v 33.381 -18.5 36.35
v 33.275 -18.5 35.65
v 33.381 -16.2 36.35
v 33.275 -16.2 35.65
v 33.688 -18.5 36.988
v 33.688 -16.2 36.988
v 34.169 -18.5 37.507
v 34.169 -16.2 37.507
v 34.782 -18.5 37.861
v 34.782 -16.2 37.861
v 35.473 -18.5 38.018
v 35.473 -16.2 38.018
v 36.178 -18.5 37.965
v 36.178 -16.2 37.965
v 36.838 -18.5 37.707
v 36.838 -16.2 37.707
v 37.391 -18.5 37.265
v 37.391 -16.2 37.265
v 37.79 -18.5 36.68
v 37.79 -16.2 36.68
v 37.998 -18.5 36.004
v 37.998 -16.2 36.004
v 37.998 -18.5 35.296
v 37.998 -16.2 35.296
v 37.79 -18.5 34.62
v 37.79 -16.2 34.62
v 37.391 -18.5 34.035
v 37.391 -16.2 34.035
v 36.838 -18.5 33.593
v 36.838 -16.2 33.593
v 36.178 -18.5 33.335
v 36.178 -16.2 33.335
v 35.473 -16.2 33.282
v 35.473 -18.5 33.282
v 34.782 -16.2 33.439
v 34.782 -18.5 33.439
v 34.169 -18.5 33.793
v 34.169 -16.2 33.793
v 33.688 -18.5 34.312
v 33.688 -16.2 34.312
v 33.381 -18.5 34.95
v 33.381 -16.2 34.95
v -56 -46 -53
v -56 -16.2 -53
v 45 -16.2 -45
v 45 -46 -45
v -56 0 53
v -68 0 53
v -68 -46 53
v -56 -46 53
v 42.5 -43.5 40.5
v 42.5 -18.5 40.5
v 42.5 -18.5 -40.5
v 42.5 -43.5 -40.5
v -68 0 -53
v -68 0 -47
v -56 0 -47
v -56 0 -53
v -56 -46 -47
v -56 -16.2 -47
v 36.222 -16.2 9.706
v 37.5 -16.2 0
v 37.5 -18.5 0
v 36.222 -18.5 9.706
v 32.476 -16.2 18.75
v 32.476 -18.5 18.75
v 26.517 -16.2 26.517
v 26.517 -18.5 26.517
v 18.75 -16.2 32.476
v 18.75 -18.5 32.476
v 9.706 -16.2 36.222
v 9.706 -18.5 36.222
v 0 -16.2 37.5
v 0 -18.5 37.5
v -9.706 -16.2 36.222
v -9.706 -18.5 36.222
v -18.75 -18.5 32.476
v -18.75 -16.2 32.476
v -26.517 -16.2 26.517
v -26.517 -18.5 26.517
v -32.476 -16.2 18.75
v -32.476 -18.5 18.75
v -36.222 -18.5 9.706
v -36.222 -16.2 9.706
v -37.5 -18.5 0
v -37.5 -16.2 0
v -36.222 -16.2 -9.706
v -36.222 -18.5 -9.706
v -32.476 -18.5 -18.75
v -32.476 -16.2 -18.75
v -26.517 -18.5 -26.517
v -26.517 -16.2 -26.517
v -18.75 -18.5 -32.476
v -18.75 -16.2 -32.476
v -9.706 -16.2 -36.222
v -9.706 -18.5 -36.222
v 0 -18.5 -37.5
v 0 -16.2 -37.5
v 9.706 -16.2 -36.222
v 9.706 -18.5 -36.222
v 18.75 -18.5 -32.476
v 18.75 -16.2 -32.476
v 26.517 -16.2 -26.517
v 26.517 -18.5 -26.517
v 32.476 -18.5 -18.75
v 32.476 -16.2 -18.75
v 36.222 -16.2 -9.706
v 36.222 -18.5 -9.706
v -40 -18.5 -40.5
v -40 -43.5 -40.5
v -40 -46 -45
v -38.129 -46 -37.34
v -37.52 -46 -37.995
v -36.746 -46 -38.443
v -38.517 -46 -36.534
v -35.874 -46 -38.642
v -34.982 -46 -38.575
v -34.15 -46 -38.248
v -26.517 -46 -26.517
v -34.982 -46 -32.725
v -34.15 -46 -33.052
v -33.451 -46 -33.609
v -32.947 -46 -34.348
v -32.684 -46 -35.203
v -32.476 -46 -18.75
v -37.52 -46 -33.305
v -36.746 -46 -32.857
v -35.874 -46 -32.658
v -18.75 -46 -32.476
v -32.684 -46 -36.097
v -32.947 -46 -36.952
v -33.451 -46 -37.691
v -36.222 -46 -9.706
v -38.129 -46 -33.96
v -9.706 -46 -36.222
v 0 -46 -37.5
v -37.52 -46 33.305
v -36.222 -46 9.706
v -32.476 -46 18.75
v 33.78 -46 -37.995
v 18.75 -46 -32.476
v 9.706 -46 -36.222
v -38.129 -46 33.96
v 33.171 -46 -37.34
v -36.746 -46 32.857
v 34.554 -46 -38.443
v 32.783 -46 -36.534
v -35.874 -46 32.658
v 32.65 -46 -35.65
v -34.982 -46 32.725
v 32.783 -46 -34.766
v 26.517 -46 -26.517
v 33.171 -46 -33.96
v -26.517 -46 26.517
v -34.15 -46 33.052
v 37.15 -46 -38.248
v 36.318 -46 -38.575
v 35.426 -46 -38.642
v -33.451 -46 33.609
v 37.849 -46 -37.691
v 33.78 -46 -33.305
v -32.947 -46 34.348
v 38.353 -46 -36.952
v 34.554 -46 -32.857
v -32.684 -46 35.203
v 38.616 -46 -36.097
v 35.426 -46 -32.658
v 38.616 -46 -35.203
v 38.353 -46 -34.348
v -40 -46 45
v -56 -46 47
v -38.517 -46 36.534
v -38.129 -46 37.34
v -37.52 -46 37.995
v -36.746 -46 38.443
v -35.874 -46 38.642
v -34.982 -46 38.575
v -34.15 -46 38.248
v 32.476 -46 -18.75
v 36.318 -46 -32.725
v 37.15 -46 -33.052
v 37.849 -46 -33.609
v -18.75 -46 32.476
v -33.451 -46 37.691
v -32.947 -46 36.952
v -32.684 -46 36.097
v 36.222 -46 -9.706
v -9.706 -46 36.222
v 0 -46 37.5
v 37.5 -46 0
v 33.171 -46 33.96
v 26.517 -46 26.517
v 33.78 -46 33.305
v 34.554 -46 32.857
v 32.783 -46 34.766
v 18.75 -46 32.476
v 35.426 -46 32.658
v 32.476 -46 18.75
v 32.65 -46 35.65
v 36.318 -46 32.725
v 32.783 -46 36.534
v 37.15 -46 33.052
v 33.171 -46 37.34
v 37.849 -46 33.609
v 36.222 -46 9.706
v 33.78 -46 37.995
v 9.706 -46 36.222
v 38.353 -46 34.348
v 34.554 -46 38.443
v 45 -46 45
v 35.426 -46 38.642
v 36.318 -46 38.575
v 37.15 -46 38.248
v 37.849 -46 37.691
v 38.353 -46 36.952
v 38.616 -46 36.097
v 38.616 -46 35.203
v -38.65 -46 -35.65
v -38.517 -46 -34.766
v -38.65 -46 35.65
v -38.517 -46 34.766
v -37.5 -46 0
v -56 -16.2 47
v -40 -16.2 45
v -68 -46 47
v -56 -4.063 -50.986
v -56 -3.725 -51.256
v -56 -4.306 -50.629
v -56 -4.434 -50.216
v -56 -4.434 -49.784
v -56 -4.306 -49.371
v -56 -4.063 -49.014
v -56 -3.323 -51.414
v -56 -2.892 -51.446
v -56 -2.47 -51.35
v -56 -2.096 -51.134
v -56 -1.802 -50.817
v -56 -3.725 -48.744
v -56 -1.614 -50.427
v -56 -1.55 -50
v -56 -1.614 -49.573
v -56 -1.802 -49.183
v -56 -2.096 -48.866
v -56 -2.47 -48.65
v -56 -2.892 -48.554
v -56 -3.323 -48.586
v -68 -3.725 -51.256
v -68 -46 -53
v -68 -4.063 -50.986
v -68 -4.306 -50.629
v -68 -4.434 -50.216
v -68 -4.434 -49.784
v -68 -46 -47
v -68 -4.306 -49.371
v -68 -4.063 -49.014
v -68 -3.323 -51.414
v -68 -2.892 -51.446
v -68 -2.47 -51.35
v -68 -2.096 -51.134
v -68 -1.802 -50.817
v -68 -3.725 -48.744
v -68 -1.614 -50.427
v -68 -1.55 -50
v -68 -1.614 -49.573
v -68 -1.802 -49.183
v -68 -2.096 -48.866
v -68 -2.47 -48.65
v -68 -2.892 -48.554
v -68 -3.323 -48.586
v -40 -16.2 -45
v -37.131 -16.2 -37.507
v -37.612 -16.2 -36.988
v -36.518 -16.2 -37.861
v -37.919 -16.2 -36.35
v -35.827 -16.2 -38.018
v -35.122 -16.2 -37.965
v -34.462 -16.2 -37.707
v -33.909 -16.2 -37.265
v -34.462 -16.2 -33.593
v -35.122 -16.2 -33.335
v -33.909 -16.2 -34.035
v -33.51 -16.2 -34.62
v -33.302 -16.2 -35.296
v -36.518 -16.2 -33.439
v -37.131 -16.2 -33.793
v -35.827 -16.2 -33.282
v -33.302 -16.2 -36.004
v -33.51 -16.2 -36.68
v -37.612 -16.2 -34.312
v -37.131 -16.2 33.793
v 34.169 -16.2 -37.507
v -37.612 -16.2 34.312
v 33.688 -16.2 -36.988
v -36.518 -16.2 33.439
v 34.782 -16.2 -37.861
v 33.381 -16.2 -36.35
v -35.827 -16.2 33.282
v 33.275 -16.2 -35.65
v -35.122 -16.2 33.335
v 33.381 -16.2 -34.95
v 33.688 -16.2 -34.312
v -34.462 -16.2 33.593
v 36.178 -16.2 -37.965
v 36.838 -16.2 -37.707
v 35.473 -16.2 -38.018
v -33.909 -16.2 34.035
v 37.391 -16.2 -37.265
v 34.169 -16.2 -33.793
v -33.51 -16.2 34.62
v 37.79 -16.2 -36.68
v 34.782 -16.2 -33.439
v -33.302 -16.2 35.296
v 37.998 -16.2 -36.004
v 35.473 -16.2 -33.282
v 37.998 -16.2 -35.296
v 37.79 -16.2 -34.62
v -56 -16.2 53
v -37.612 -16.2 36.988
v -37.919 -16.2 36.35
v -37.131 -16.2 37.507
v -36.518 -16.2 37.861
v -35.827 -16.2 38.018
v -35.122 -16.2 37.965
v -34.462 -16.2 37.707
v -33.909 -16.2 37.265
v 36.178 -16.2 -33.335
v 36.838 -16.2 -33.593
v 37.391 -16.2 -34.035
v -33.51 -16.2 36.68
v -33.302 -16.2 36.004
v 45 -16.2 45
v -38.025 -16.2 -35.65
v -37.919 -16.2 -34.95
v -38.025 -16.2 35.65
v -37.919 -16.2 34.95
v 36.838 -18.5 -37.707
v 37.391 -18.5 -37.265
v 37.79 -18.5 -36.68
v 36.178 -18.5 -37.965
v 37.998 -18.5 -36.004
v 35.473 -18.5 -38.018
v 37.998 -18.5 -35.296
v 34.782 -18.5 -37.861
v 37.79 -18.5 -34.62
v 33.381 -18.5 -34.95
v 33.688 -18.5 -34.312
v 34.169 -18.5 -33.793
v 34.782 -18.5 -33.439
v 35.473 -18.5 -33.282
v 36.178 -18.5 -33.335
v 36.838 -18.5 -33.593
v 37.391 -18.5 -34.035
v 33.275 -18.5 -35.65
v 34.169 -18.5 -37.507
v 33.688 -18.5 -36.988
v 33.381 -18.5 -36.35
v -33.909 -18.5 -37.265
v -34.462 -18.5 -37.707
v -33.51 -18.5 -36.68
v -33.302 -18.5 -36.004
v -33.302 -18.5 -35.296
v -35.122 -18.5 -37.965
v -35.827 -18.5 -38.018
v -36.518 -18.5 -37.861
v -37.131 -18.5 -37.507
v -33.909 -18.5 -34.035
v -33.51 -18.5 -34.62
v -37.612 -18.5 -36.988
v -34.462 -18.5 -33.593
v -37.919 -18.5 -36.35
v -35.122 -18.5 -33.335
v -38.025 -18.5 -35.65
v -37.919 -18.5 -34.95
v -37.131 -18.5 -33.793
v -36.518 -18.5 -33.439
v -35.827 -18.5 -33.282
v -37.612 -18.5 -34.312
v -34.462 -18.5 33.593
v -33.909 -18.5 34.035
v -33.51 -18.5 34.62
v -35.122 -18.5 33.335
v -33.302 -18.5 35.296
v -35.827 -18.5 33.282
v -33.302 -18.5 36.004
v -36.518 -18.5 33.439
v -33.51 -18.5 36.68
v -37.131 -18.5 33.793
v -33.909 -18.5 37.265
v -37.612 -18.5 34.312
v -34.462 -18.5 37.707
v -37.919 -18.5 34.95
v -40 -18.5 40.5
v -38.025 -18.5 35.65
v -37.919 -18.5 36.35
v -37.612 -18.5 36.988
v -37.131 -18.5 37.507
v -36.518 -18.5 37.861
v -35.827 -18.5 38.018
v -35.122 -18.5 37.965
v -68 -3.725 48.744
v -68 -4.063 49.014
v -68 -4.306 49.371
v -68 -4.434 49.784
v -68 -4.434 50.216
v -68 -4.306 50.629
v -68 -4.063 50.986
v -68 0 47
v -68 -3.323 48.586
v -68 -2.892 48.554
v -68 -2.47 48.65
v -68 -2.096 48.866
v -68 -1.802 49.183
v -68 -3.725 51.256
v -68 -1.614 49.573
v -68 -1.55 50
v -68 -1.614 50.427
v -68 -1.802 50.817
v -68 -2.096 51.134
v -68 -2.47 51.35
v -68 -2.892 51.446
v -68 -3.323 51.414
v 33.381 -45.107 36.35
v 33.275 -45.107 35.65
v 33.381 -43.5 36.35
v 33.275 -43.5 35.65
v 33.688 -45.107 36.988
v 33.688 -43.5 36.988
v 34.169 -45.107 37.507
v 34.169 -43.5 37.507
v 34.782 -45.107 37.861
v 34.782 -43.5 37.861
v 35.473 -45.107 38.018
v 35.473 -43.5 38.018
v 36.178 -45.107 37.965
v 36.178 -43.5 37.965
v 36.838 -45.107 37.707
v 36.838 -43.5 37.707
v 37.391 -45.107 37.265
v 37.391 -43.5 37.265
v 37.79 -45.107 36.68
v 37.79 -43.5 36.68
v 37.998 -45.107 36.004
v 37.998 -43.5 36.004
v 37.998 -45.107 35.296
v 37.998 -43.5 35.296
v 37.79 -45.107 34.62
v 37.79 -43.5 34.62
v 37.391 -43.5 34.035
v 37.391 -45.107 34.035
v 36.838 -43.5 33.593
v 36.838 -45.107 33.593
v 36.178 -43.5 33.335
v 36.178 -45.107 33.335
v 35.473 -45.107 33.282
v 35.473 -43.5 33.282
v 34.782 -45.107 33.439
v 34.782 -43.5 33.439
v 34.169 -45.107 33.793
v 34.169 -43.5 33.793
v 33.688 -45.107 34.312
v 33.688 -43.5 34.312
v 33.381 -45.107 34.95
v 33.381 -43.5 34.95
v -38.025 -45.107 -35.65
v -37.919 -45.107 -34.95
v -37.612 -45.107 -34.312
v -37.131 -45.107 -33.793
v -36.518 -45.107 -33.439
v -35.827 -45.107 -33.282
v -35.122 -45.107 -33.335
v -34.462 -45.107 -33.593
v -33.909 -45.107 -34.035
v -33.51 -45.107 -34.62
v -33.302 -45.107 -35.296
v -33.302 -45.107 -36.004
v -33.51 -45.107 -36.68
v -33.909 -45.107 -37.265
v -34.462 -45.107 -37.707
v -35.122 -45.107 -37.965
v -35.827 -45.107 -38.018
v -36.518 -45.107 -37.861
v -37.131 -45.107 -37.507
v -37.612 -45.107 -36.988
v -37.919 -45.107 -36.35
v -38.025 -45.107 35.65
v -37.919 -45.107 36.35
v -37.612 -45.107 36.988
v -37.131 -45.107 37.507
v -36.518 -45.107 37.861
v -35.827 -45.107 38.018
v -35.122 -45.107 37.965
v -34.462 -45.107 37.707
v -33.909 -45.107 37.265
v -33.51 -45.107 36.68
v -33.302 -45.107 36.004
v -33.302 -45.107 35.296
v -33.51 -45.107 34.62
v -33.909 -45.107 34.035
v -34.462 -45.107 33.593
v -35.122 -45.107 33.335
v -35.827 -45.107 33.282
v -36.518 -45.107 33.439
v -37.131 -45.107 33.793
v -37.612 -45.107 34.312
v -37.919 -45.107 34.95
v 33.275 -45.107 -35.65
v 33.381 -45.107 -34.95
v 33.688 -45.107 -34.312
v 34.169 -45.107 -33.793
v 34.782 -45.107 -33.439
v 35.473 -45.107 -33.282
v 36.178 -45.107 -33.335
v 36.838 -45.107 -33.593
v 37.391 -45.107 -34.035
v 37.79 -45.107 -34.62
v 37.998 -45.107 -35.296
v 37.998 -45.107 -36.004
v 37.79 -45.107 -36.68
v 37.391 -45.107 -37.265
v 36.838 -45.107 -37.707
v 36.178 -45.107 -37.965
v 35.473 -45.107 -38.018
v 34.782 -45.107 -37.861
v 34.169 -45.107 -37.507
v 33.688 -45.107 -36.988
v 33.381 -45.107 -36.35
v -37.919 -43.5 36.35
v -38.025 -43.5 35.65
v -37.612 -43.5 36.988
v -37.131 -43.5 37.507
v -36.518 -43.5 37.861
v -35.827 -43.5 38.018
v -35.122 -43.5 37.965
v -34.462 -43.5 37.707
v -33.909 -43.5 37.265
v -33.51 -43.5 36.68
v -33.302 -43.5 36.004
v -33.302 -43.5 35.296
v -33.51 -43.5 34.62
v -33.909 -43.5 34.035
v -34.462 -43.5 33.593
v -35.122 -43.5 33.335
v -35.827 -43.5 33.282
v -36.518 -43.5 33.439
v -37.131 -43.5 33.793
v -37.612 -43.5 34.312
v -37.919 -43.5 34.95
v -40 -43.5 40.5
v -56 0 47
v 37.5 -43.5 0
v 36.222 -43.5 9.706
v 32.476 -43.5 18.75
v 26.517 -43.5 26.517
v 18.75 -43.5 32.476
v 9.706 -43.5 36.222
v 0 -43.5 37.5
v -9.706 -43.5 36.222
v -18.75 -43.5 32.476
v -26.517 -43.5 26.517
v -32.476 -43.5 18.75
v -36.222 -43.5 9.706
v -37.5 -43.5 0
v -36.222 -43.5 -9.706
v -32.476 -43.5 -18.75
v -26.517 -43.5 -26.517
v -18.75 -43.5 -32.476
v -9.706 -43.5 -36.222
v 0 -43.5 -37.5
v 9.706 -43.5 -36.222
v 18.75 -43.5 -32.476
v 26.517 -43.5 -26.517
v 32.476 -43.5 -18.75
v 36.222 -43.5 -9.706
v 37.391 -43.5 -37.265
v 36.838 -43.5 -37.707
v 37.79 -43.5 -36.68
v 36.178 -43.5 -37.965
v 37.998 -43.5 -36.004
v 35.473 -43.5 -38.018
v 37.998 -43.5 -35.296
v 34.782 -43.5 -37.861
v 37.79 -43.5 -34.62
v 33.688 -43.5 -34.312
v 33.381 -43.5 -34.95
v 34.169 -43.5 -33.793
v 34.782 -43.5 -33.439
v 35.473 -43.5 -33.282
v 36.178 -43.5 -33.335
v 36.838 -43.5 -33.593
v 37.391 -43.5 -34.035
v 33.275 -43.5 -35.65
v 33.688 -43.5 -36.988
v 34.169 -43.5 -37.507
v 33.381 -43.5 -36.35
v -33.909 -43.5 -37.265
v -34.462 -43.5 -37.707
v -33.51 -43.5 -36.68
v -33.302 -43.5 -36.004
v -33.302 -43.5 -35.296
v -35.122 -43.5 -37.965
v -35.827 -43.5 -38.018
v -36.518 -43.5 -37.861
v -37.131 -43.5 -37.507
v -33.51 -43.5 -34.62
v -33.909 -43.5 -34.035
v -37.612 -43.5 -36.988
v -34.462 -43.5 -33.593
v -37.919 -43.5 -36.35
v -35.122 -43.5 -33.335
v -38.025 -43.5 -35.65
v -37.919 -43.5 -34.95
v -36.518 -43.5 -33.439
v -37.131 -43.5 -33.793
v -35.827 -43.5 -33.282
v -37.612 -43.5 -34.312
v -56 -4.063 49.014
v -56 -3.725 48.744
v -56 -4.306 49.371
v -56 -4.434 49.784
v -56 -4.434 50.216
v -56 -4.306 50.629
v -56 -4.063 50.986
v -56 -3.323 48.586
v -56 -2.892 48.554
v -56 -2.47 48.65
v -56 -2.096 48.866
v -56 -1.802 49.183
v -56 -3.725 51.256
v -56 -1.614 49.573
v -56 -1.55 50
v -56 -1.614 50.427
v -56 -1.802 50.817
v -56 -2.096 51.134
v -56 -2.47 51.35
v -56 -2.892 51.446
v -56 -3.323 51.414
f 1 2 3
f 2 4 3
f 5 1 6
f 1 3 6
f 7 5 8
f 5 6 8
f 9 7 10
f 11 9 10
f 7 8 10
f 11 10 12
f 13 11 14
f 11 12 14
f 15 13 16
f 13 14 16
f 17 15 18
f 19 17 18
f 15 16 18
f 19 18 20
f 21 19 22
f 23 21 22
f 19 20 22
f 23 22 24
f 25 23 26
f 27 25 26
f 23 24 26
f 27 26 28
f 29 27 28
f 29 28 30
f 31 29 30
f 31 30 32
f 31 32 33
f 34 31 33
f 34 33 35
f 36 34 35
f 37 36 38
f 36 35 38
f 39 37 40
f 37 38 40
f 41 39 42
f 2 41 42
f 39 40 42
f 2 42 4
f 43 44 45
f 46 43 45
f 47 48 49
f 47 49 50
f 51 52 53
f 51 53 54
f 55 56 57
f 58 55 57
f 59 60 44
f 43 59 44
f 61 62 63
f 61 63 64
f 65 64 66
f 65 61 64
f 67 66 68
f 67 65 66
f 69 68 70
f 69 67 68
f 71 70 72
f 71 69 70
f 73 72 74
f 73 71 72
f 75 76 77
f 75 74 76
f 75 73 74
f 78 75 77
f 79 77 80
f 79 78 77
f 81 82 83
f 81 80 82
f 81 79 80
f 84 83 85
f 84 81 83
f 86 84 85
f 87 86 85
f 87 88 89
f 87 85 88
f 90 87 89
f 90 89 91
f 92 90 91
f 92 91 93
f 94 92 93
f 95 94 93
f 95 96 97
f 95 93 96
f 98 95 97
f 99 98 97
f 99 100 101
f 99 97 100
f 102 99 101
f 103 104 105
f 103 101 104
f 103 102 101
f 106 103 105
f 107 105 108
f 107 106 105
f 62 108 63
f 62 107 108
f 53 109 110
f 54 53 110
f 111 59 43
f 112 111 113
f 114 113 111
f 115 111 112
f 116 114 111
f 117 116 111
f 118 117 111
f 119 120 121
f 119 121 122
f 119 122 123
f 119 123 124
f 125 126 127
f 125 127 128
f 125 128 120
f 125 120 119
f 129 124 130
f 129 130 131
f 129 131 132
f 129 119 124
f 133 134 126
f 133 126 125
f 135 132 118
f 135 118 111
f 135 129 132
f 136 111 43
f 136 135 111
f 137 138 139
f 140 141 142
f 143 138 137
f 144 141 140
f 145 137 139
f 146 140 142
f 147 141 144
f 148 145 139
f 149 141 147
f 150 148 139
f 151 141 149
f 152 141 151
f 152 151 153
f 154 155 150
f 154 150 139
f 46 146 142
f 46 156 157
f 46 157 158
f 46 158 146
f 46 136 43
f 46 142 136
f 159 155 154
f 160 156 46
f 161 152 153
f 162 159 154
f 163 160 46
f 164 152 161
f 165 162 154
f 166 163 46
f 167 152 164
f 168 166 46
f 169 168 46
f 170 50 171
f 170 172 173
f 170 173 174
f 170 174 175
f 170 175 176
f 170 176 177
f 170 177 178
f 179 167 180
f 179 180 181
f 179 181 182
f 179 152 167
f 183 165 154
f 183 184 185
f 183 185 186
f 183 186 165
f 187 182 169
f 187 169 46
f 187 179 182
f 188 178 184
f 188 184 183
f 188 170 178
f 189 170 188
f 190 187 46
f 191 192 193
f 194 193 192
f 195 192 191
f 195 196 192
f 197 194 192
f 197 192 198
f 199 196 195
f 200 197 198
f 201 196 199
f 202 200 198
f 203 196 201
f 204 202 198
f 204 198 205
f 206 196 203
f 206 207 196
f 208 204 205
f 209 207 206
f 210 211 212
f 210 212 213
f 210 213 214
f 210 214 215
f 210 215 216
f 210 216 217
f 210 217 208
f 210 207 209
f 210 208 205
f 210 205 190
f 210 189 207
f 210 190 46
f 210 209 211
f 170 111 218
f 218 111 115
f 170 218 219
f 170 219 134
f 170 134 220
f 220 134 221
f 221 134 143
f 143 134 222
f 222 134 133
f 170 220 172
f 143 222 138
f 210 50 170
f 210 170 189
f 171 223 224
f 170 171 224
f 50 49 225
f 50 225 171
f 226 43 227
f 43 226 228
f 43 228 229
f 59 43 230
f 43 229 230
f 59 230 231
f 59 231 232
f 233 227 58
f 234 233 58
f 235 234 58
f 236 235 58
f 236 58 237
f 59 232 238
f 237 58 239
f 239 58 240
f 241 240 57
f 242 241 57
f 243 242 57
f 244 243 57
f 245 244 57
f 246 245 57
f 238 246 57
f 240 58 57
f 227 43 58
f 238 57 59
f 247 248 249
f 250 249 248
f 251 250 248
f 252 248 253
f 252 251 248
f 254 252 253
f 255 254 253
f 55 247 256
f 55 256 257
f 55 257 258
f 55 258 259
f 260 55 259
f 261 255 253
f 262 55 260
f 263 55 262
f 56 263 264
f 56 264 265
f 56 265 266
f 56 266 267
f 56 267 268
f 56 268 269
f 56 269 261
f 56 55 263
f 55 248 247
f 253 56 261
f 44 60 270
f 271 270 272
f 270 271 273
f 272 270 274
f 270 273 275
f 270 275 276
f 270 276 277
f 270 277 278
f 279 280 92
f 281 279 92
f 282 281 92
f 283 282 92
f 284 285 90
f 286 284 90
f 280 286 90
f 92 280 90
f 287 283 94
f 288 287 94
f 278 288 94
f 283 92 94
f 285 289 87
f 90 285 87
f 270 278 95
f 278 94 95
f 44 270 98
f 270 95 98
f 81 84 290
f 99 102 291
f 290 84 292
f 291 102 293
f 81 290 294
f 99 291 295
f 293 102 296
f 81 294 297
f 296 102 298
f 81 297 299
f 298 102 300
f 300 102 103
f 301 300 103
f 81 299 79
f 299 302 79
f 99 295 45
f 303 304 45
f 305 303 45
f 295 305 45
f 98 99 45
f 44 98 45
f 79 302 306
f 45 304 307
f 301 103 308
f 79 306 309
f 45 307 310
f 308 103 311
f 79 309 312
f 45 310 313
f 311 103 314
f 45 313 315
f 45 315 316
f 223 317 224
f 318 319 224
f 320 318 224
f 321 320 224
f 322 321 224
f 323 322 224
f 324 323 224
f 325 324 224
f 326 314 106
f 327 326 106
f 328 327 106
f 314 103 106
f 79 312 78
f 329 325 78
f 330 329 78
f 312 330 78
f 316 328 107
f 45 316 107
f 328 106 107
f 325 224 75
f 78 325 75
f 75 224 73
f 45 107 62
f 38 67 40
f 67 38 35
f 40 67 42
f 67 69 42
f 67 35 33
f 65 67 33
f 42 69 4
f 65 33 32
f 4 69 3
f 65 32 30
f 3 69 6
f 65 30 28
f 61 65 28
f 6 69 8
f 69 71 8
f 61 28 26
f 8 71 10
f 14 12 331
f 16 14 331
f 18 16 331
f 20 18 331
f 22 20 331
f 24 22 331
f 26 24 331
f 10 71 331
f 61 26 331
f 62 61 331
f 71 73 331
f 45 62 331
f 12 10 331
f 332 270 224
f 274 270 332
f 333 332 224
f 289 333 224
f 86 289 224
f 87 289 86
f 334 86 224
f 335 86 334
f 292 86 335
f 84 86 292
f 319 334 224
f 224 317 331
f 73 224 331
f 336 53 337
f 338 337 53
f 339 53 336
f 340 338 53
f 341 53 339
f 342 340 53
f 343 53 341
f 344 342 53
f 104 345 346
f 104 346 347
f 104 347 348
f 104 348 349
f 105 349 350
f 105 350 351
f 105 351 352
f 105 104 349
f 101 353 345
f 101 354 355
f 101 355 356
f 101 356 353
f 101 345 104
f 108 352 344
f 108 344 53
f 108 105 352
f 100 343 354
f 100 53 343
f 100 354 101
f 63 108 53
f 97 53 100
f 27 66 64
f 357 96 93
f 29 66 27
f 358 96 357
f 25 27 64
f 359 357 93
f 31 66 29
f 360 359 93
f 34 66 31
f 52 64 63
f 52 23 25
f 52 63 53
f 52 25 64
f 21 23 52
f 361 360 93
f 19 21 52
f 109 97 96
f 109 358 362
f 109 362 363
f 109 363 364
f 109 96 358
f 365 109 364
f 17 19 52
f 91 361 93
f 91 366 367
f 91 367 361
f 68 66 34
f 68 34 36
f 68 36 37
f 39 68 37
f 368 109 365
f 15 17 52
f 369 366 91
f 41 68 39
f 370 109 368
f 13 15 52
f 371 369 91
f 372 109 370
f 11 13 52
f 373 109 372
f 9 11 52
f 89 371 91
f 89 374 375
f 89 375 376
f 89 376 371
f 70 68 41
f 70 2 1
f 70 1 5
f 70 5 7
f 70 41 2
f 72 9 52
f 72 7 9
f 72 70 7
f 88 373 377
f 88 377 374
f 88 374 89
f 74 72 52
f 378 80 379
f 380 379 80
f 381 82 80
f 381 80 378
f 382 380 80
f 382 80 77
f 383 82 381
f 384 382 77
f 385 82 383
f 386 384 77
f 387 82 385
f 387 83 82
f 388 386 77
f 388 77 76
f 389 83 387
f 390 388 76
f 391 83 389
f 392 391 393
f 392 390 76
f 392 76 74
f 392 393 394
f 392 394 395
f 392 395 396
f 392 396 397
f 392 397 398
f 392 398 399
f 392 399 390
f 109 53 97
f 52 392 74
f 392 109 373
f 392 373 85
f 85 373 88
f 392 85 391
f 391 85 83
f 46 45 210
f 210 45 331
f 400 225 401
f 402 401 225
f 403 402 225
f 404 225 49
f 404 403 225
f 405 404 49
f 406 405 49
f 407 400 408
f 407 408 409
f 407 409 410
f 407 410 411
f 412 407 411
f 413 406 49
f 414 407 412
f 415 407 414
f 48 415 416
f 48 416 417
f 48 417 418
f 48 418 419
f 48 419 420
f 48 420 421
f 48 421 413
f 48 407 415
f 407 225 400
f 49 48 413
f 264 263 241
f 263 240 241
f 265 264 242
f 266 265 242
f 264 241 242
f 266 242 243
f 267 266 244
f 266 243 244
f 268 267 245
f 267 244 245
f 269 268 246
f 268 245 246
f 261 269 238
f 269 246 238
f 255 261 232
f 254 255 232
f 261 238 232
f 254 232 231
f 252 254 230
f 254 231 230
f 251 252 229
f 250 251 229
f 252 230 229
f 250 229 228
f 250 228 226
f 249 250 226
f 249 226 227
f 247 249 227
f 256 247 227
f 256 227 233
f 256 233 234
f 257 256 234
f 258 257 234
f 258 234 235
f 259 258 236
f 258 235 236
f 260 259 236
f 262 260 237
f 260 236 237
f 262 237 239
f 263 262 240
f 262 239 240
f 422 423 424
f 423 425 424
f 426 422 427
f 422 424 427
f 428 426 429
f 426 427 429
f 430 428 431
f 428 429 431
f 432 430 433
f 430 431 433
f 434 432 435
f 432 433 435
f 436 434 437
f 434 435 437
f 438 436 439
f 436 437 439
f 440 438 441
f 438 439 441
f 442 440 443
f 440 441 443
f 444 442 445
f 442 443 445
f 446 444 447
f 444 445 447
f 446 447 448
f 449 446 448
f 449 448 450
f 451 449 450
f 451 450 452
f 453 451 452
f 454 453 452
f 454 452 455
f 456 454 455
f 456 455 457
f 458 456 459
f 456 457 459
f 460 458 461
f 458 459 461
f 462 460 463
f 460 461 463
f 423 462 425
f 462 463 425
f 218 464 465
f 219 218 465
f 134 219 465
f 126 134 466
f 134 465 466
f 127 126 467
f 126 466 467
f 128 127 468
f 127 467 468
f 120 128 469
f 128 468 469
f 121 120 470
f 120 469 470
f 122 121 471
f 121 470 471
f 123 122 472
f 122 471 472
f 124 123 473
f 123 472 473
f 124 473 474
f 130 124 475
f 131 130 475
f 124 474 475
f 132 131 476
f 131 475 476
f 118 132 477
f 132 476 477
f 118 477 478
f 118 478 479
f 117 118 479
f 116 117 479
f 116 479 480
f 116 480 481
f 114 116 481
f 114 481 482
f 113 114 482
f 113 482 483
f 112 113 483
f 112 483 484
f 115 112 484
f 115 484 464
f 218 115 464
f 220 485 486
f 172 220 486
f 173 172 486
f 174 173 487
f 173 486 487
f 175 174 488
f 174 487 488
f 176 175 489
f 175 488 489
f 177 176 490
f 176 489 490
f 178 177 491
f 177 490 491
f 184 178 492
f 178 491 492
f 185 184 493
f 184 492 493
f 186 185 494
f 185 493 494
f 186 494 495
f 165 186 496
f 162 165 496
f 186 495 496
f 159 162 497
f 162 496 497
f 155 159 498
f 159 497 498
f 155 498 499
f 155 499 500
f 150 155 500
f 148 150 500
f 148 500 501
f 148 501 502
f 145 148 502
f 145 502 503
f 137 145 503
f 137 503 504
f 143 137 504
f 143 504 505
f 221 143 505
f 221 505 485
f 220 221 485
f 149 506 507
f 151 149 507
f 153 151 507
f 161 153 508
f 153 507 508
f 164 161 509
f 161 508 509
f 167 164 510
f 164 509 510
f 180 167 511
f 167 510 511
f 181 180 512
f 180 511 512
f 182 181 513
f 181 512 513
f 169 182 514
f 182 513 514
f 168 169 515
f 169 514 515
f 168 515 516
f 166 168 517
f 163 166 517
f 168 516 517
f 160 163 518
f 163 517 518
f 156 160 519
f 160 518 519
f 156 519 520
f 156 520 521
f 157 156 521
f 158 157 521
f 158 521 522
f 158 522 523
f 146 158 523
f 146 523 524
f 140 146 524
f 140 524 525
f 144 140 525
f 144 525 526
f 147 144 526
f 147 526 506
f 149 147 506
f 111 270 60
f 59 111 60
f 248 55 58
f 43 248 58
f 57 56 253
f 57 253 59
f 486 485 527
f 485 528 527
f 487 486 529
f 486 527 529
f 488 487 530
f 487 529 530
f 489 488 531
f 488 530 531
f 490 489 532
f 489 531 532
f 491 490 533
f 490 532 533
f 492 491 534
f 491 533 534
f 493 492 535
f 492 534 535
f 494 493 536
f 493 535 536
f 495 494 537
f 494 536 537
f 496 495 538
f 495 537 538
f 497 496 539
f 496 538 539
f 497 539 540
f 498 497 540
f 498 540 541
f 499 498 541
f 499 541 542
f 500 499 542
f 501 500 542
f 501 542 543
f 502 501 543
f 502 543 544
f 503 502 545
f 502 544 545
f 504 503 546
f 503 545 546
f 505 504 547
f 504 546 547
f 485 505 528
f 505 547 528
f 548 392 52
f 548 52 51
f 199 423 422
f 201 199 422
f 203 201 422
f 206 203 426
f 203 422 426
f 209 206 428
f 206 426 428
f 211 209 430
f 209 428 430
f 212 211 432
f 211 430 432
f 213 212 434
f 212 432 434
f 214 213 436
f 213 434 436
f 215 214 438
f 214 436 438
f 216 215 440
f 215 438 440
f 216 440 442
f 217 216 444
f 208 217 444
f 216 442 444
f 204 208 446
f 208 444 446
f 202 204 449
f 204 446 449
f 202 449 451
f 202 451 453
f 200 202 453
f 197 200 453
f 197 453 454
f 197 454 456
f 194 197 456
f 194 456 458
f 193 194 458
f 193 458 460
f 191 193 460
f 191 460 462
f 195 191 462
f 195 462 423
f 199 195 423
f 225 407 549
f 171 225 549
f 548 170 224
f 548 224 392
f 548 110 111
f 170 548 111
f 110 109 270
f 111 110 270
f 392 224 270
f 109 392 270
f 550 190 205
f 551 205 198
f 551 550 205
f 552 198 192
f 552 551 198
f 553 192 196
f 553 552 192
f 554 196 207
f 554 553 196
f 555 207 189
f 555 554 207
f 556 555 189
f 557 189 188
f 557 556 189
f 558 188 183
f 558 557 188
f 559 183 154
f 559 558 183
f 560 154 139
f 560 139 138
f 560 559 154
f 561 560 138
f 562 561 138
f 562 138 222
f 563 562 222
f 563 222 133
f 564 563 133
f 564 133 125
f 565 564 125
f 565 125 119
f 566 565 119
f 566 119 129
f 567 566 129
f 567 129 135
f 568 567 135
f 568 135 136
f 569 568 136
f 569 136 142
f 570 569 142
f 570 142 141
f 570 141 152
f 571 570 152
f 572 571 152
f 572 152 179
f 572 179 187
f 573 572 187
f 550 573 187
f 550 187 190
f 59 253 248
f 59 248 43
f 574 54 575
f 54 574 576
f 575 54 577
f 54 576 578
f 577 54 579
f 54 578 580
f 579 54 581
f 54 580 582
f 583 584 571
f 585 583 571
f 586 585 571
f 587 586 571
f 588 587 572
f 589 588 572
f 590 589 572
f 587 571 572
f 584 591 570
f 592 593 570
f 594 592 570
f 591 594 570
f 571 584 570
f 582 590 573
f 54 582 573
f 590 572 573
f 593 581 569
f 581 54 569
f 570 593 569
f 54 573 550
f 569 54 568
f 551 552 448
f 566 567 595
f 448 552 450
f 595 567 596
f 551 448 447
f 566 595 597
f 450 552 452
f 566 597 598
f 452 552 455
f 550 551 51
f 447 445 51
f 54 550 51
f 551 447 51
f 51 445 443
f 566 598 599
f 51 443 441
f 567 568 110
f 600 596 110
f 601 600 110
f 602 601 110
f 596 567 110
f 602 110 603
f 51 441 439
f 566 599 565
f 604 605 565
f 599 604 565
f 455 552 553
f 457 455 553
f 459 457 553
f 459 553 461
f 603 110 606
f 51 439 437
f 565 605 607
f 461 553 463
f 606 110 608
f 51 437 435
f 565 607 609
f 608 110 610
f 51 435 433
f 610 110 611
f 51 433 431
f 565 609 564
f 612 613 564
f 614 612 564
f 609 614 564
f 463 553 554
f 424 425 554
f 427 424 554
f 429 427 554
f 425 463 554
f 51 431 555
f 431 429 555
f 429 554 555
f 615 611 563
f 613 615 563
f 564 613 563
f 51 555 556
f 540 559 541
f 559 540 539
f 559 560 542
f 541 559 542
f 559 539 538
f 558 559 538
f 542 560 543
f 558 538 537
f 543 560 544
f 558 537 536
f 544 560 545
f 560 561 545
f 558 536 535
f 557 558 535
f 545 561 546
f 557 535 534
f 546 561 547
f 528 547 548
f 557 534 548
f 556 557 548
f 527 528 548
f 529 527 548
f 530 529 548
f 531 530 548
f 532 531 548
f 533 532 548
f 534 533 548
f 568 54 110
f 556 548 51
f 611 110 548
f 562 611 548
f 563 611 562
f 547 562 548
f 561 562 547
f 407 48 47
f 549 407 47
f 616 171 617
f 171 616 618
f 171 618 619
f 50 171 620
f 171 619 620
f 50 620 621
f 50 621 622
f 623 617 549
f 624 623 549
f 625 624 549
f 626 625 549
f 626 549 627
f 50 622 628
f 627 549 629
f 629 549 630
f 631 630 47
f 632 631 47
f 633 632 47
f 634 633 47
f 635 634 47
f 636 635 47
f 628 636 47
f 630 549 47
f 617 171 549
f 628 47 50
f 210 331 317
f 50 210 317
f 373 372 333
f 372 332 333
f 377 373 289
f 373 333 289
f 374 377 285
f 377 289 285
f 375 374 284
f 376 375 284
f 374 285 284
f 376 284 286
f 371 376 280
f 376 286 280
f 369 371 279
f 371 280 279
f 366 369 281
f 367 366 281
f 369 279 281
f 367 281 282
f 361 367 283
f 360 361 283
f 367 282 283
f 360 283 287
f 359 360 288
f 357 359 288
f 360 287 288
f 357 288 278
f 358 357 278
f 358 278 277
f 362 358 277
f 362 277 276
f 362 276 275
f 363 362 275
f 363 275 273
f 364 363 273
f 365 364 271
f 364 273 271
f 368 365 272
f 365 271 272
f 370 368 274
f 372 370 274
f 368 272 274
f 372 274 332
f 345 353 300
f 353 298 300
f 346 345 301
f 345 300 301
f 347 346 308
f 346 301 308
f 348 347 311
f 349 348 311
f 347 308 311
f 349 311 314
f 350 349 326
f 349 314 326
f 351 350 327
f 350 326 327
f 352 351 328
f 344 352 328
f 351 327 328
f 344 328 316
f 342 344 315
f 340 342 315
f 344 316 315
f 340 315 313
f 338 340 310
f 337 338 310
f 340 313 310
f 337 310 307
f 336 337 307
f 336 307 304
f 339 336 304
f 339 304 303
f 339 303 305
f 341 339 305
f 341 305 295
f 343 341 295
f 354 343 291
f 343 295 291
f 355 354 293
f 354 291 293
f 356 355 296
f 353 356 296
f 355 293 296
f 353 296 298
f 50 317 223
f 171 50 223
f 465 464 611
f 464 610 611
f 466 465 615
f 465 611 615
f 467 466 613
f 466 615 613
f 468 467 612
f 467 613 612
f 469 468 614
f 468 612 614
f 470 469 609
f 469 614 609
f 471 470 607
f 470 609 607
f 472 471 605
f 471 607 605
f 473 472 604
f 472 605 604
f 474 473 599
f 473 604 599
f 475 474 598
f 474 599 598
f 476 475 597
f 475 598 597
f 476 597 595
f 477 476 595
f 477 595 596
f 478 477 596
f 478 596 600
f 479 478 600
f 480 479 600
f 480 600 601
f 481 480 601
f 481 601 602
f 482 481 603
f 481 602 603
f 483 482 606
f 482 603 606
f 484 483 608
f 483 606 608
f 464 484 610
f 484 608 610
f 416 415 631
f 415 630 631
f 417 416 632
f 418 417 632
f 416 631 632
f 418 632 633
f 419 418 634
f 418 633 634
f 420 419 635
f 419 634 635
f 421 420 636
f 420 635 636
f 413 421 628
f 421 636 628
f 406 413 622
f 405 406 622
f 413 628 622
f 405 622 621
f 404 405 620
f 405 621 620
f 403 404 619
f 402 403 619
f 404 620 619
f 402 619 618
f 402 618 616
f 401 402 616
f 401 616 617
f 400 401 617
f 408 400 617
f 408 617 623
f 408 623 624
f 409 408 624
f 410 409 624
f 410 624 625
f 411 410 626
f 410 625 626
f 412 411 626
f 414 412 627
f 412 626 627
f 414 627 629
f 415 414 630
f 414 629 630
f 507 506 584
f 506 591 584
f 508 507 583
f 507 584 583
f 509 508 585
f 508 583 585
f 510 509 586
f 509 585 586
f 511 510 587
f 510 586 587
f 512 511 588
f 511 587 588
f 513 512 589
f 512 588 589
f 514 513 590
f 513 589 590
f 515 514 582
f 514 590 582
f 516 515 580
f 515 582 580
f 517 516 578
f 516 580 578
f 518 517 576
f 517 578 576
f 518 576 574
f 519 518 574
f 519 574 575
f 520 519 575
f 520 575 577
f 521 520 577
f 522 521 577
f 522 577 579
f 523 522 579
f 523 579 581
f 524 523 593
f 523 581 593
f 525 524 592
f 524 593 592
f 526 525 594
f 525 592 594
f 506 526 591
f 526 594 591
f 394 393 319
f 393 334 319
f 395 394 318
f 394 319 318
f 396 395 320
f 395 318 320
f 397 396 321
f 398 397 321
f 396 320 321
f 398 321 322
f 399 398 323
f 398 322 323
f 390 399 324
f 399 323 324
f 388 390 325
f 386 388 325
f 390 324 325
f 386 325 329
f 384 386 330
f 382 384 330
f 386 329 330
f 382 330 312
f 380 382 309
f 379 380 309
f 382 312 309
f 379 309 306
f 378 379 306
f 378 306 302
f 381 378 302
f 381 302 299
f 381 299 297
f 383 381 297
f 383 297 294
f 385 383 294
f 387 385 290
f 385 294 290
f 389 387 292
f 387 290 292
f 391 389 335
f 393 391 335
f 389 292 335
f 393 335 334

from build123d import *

# Parameters (mm, degrees)
F0_W            = 12
F0_H            = 6
F1_DEPTH        = 46
F3_D            = 2.9
F3_DEPTH        = 12
F3_TIP          = 0.8712478976
F5_D            = 2.9
F5_DEPTH        = 12
F5_TIP          = 0.8712478976
F6_START        = 16.2
F0_W_2          = 80
F0_H_2          = 80
F0_R            = 37.5
F6_DEPTH        = 29.8
F7_W            = 25
F7_H            = 81
F8_DEPTH        = 82.5
F10_D           = 4.75
F10_DEPTH       = 30
F10_CSINK_D     = 6
F10_CSINK_ANGLE = 70
F10_TIP         = 1.4270439702


with BuildPart() as f1:
    # F0 (on Front) → F1 (new body)
    with BuildSketch(Plane.XZ):
        with Locations((-62, 50)):
            Rectangle(F0_W, F0_H)
    extrude(amount=F1_DEPTH)

    # F3
    with Locations(Plane(origin=(-68, 0, 0), x_dir=(0, -1, 0), z_dir=(-1, 0, 0))):
        with Locations((3, 50)):
            Hole(F3_D / 2, depth=F3_DEPTH)
            with Locations((0, 0, -(F3_DEPTH + F3_TIP / 2))):  # 118° drill point
                Cone(0, F3_D / 2, F3_TIP, mode=Mode.SUBTRACT)


with BuildPart() as f1b:
    # F0 (on Front) → F1, piece 2 (new body)
    with BuildSketch(Plane.XZ):
        with Locations((-62, -50)):
            Rectangle(F0_W, F0_H)
    extrude(amount=F1_DEPTH)

    # F5
    with Locations(Plane(origin=(-68, 0, 0), x_dir=(0, -1, 0), z_dir=(-1, 0, 0))):
        with Locations((3, -50)):
            Hole(F5_D / 2, depth=F5_DEPTH)
            with Locations((0, 0, -(F5_DEPTH + F5_TIP / 2))):  # 118° drill point
                Cone(0, F5_D / 2, F5_TIP, mode=Mode.SUBTRACT)


with BuildPart() as f6:
    # F0 (on Front) → F6 (new body)
    with BuildSketch(Plane.XZ.offset(F6_START)):
        Polygon((-56, 47), (-40, 45), (45, 45), (-56, 53), align=None)
        Polygon((-40, 45), (-40, 40), (40, 40), (40, -40), (-40, -40), (-40, -45), (45, -45), (45, 45), align=None)
        Rectangle(F0_W_2, F0_H_2)
        Circle(F0_R, mode=Mode.SUBTRACT)
        Polygon((45, -45), (-40, -45), (-56, -47), (-56, -53), align=None)
    extrude(amount=F6_DEPTH)

    # F7 (on face) → F8 (cut)
    with BuildSketch(Plane(origin=(-40, 0, 0), x_dir=(0, -1, 0), z_dir=(-1, 0, 0))):
        with Locations((31, 0)):
            Rectangle(F7_W, F7_H)
    extrude(amount=-F8_DEPTH, mode=Mode.SUBTRACT)

    # F10
    with Locations(Plane.XZ.offset(46)):
        with Locations((35.65, 35.65), (35.65, -35.65), (-35.65, -35.65), (-35.65, 35.65)):
            CounterSinkHole(F10_D / 2, F10_CSINK_D / 2, depth=F10_DEPTH, counter_sink_angle=F10_CSINK_ANGLE)
            with Locations((0, 0, -(F10_DEPTH + F10_TIP / 2))):  # 118° drill point
                Cone(0, F10_D / 2, F10_TIP, mode=Mode.SUBTRACT)


solid = Compound([f1.part, f1b.part, f6.part])
